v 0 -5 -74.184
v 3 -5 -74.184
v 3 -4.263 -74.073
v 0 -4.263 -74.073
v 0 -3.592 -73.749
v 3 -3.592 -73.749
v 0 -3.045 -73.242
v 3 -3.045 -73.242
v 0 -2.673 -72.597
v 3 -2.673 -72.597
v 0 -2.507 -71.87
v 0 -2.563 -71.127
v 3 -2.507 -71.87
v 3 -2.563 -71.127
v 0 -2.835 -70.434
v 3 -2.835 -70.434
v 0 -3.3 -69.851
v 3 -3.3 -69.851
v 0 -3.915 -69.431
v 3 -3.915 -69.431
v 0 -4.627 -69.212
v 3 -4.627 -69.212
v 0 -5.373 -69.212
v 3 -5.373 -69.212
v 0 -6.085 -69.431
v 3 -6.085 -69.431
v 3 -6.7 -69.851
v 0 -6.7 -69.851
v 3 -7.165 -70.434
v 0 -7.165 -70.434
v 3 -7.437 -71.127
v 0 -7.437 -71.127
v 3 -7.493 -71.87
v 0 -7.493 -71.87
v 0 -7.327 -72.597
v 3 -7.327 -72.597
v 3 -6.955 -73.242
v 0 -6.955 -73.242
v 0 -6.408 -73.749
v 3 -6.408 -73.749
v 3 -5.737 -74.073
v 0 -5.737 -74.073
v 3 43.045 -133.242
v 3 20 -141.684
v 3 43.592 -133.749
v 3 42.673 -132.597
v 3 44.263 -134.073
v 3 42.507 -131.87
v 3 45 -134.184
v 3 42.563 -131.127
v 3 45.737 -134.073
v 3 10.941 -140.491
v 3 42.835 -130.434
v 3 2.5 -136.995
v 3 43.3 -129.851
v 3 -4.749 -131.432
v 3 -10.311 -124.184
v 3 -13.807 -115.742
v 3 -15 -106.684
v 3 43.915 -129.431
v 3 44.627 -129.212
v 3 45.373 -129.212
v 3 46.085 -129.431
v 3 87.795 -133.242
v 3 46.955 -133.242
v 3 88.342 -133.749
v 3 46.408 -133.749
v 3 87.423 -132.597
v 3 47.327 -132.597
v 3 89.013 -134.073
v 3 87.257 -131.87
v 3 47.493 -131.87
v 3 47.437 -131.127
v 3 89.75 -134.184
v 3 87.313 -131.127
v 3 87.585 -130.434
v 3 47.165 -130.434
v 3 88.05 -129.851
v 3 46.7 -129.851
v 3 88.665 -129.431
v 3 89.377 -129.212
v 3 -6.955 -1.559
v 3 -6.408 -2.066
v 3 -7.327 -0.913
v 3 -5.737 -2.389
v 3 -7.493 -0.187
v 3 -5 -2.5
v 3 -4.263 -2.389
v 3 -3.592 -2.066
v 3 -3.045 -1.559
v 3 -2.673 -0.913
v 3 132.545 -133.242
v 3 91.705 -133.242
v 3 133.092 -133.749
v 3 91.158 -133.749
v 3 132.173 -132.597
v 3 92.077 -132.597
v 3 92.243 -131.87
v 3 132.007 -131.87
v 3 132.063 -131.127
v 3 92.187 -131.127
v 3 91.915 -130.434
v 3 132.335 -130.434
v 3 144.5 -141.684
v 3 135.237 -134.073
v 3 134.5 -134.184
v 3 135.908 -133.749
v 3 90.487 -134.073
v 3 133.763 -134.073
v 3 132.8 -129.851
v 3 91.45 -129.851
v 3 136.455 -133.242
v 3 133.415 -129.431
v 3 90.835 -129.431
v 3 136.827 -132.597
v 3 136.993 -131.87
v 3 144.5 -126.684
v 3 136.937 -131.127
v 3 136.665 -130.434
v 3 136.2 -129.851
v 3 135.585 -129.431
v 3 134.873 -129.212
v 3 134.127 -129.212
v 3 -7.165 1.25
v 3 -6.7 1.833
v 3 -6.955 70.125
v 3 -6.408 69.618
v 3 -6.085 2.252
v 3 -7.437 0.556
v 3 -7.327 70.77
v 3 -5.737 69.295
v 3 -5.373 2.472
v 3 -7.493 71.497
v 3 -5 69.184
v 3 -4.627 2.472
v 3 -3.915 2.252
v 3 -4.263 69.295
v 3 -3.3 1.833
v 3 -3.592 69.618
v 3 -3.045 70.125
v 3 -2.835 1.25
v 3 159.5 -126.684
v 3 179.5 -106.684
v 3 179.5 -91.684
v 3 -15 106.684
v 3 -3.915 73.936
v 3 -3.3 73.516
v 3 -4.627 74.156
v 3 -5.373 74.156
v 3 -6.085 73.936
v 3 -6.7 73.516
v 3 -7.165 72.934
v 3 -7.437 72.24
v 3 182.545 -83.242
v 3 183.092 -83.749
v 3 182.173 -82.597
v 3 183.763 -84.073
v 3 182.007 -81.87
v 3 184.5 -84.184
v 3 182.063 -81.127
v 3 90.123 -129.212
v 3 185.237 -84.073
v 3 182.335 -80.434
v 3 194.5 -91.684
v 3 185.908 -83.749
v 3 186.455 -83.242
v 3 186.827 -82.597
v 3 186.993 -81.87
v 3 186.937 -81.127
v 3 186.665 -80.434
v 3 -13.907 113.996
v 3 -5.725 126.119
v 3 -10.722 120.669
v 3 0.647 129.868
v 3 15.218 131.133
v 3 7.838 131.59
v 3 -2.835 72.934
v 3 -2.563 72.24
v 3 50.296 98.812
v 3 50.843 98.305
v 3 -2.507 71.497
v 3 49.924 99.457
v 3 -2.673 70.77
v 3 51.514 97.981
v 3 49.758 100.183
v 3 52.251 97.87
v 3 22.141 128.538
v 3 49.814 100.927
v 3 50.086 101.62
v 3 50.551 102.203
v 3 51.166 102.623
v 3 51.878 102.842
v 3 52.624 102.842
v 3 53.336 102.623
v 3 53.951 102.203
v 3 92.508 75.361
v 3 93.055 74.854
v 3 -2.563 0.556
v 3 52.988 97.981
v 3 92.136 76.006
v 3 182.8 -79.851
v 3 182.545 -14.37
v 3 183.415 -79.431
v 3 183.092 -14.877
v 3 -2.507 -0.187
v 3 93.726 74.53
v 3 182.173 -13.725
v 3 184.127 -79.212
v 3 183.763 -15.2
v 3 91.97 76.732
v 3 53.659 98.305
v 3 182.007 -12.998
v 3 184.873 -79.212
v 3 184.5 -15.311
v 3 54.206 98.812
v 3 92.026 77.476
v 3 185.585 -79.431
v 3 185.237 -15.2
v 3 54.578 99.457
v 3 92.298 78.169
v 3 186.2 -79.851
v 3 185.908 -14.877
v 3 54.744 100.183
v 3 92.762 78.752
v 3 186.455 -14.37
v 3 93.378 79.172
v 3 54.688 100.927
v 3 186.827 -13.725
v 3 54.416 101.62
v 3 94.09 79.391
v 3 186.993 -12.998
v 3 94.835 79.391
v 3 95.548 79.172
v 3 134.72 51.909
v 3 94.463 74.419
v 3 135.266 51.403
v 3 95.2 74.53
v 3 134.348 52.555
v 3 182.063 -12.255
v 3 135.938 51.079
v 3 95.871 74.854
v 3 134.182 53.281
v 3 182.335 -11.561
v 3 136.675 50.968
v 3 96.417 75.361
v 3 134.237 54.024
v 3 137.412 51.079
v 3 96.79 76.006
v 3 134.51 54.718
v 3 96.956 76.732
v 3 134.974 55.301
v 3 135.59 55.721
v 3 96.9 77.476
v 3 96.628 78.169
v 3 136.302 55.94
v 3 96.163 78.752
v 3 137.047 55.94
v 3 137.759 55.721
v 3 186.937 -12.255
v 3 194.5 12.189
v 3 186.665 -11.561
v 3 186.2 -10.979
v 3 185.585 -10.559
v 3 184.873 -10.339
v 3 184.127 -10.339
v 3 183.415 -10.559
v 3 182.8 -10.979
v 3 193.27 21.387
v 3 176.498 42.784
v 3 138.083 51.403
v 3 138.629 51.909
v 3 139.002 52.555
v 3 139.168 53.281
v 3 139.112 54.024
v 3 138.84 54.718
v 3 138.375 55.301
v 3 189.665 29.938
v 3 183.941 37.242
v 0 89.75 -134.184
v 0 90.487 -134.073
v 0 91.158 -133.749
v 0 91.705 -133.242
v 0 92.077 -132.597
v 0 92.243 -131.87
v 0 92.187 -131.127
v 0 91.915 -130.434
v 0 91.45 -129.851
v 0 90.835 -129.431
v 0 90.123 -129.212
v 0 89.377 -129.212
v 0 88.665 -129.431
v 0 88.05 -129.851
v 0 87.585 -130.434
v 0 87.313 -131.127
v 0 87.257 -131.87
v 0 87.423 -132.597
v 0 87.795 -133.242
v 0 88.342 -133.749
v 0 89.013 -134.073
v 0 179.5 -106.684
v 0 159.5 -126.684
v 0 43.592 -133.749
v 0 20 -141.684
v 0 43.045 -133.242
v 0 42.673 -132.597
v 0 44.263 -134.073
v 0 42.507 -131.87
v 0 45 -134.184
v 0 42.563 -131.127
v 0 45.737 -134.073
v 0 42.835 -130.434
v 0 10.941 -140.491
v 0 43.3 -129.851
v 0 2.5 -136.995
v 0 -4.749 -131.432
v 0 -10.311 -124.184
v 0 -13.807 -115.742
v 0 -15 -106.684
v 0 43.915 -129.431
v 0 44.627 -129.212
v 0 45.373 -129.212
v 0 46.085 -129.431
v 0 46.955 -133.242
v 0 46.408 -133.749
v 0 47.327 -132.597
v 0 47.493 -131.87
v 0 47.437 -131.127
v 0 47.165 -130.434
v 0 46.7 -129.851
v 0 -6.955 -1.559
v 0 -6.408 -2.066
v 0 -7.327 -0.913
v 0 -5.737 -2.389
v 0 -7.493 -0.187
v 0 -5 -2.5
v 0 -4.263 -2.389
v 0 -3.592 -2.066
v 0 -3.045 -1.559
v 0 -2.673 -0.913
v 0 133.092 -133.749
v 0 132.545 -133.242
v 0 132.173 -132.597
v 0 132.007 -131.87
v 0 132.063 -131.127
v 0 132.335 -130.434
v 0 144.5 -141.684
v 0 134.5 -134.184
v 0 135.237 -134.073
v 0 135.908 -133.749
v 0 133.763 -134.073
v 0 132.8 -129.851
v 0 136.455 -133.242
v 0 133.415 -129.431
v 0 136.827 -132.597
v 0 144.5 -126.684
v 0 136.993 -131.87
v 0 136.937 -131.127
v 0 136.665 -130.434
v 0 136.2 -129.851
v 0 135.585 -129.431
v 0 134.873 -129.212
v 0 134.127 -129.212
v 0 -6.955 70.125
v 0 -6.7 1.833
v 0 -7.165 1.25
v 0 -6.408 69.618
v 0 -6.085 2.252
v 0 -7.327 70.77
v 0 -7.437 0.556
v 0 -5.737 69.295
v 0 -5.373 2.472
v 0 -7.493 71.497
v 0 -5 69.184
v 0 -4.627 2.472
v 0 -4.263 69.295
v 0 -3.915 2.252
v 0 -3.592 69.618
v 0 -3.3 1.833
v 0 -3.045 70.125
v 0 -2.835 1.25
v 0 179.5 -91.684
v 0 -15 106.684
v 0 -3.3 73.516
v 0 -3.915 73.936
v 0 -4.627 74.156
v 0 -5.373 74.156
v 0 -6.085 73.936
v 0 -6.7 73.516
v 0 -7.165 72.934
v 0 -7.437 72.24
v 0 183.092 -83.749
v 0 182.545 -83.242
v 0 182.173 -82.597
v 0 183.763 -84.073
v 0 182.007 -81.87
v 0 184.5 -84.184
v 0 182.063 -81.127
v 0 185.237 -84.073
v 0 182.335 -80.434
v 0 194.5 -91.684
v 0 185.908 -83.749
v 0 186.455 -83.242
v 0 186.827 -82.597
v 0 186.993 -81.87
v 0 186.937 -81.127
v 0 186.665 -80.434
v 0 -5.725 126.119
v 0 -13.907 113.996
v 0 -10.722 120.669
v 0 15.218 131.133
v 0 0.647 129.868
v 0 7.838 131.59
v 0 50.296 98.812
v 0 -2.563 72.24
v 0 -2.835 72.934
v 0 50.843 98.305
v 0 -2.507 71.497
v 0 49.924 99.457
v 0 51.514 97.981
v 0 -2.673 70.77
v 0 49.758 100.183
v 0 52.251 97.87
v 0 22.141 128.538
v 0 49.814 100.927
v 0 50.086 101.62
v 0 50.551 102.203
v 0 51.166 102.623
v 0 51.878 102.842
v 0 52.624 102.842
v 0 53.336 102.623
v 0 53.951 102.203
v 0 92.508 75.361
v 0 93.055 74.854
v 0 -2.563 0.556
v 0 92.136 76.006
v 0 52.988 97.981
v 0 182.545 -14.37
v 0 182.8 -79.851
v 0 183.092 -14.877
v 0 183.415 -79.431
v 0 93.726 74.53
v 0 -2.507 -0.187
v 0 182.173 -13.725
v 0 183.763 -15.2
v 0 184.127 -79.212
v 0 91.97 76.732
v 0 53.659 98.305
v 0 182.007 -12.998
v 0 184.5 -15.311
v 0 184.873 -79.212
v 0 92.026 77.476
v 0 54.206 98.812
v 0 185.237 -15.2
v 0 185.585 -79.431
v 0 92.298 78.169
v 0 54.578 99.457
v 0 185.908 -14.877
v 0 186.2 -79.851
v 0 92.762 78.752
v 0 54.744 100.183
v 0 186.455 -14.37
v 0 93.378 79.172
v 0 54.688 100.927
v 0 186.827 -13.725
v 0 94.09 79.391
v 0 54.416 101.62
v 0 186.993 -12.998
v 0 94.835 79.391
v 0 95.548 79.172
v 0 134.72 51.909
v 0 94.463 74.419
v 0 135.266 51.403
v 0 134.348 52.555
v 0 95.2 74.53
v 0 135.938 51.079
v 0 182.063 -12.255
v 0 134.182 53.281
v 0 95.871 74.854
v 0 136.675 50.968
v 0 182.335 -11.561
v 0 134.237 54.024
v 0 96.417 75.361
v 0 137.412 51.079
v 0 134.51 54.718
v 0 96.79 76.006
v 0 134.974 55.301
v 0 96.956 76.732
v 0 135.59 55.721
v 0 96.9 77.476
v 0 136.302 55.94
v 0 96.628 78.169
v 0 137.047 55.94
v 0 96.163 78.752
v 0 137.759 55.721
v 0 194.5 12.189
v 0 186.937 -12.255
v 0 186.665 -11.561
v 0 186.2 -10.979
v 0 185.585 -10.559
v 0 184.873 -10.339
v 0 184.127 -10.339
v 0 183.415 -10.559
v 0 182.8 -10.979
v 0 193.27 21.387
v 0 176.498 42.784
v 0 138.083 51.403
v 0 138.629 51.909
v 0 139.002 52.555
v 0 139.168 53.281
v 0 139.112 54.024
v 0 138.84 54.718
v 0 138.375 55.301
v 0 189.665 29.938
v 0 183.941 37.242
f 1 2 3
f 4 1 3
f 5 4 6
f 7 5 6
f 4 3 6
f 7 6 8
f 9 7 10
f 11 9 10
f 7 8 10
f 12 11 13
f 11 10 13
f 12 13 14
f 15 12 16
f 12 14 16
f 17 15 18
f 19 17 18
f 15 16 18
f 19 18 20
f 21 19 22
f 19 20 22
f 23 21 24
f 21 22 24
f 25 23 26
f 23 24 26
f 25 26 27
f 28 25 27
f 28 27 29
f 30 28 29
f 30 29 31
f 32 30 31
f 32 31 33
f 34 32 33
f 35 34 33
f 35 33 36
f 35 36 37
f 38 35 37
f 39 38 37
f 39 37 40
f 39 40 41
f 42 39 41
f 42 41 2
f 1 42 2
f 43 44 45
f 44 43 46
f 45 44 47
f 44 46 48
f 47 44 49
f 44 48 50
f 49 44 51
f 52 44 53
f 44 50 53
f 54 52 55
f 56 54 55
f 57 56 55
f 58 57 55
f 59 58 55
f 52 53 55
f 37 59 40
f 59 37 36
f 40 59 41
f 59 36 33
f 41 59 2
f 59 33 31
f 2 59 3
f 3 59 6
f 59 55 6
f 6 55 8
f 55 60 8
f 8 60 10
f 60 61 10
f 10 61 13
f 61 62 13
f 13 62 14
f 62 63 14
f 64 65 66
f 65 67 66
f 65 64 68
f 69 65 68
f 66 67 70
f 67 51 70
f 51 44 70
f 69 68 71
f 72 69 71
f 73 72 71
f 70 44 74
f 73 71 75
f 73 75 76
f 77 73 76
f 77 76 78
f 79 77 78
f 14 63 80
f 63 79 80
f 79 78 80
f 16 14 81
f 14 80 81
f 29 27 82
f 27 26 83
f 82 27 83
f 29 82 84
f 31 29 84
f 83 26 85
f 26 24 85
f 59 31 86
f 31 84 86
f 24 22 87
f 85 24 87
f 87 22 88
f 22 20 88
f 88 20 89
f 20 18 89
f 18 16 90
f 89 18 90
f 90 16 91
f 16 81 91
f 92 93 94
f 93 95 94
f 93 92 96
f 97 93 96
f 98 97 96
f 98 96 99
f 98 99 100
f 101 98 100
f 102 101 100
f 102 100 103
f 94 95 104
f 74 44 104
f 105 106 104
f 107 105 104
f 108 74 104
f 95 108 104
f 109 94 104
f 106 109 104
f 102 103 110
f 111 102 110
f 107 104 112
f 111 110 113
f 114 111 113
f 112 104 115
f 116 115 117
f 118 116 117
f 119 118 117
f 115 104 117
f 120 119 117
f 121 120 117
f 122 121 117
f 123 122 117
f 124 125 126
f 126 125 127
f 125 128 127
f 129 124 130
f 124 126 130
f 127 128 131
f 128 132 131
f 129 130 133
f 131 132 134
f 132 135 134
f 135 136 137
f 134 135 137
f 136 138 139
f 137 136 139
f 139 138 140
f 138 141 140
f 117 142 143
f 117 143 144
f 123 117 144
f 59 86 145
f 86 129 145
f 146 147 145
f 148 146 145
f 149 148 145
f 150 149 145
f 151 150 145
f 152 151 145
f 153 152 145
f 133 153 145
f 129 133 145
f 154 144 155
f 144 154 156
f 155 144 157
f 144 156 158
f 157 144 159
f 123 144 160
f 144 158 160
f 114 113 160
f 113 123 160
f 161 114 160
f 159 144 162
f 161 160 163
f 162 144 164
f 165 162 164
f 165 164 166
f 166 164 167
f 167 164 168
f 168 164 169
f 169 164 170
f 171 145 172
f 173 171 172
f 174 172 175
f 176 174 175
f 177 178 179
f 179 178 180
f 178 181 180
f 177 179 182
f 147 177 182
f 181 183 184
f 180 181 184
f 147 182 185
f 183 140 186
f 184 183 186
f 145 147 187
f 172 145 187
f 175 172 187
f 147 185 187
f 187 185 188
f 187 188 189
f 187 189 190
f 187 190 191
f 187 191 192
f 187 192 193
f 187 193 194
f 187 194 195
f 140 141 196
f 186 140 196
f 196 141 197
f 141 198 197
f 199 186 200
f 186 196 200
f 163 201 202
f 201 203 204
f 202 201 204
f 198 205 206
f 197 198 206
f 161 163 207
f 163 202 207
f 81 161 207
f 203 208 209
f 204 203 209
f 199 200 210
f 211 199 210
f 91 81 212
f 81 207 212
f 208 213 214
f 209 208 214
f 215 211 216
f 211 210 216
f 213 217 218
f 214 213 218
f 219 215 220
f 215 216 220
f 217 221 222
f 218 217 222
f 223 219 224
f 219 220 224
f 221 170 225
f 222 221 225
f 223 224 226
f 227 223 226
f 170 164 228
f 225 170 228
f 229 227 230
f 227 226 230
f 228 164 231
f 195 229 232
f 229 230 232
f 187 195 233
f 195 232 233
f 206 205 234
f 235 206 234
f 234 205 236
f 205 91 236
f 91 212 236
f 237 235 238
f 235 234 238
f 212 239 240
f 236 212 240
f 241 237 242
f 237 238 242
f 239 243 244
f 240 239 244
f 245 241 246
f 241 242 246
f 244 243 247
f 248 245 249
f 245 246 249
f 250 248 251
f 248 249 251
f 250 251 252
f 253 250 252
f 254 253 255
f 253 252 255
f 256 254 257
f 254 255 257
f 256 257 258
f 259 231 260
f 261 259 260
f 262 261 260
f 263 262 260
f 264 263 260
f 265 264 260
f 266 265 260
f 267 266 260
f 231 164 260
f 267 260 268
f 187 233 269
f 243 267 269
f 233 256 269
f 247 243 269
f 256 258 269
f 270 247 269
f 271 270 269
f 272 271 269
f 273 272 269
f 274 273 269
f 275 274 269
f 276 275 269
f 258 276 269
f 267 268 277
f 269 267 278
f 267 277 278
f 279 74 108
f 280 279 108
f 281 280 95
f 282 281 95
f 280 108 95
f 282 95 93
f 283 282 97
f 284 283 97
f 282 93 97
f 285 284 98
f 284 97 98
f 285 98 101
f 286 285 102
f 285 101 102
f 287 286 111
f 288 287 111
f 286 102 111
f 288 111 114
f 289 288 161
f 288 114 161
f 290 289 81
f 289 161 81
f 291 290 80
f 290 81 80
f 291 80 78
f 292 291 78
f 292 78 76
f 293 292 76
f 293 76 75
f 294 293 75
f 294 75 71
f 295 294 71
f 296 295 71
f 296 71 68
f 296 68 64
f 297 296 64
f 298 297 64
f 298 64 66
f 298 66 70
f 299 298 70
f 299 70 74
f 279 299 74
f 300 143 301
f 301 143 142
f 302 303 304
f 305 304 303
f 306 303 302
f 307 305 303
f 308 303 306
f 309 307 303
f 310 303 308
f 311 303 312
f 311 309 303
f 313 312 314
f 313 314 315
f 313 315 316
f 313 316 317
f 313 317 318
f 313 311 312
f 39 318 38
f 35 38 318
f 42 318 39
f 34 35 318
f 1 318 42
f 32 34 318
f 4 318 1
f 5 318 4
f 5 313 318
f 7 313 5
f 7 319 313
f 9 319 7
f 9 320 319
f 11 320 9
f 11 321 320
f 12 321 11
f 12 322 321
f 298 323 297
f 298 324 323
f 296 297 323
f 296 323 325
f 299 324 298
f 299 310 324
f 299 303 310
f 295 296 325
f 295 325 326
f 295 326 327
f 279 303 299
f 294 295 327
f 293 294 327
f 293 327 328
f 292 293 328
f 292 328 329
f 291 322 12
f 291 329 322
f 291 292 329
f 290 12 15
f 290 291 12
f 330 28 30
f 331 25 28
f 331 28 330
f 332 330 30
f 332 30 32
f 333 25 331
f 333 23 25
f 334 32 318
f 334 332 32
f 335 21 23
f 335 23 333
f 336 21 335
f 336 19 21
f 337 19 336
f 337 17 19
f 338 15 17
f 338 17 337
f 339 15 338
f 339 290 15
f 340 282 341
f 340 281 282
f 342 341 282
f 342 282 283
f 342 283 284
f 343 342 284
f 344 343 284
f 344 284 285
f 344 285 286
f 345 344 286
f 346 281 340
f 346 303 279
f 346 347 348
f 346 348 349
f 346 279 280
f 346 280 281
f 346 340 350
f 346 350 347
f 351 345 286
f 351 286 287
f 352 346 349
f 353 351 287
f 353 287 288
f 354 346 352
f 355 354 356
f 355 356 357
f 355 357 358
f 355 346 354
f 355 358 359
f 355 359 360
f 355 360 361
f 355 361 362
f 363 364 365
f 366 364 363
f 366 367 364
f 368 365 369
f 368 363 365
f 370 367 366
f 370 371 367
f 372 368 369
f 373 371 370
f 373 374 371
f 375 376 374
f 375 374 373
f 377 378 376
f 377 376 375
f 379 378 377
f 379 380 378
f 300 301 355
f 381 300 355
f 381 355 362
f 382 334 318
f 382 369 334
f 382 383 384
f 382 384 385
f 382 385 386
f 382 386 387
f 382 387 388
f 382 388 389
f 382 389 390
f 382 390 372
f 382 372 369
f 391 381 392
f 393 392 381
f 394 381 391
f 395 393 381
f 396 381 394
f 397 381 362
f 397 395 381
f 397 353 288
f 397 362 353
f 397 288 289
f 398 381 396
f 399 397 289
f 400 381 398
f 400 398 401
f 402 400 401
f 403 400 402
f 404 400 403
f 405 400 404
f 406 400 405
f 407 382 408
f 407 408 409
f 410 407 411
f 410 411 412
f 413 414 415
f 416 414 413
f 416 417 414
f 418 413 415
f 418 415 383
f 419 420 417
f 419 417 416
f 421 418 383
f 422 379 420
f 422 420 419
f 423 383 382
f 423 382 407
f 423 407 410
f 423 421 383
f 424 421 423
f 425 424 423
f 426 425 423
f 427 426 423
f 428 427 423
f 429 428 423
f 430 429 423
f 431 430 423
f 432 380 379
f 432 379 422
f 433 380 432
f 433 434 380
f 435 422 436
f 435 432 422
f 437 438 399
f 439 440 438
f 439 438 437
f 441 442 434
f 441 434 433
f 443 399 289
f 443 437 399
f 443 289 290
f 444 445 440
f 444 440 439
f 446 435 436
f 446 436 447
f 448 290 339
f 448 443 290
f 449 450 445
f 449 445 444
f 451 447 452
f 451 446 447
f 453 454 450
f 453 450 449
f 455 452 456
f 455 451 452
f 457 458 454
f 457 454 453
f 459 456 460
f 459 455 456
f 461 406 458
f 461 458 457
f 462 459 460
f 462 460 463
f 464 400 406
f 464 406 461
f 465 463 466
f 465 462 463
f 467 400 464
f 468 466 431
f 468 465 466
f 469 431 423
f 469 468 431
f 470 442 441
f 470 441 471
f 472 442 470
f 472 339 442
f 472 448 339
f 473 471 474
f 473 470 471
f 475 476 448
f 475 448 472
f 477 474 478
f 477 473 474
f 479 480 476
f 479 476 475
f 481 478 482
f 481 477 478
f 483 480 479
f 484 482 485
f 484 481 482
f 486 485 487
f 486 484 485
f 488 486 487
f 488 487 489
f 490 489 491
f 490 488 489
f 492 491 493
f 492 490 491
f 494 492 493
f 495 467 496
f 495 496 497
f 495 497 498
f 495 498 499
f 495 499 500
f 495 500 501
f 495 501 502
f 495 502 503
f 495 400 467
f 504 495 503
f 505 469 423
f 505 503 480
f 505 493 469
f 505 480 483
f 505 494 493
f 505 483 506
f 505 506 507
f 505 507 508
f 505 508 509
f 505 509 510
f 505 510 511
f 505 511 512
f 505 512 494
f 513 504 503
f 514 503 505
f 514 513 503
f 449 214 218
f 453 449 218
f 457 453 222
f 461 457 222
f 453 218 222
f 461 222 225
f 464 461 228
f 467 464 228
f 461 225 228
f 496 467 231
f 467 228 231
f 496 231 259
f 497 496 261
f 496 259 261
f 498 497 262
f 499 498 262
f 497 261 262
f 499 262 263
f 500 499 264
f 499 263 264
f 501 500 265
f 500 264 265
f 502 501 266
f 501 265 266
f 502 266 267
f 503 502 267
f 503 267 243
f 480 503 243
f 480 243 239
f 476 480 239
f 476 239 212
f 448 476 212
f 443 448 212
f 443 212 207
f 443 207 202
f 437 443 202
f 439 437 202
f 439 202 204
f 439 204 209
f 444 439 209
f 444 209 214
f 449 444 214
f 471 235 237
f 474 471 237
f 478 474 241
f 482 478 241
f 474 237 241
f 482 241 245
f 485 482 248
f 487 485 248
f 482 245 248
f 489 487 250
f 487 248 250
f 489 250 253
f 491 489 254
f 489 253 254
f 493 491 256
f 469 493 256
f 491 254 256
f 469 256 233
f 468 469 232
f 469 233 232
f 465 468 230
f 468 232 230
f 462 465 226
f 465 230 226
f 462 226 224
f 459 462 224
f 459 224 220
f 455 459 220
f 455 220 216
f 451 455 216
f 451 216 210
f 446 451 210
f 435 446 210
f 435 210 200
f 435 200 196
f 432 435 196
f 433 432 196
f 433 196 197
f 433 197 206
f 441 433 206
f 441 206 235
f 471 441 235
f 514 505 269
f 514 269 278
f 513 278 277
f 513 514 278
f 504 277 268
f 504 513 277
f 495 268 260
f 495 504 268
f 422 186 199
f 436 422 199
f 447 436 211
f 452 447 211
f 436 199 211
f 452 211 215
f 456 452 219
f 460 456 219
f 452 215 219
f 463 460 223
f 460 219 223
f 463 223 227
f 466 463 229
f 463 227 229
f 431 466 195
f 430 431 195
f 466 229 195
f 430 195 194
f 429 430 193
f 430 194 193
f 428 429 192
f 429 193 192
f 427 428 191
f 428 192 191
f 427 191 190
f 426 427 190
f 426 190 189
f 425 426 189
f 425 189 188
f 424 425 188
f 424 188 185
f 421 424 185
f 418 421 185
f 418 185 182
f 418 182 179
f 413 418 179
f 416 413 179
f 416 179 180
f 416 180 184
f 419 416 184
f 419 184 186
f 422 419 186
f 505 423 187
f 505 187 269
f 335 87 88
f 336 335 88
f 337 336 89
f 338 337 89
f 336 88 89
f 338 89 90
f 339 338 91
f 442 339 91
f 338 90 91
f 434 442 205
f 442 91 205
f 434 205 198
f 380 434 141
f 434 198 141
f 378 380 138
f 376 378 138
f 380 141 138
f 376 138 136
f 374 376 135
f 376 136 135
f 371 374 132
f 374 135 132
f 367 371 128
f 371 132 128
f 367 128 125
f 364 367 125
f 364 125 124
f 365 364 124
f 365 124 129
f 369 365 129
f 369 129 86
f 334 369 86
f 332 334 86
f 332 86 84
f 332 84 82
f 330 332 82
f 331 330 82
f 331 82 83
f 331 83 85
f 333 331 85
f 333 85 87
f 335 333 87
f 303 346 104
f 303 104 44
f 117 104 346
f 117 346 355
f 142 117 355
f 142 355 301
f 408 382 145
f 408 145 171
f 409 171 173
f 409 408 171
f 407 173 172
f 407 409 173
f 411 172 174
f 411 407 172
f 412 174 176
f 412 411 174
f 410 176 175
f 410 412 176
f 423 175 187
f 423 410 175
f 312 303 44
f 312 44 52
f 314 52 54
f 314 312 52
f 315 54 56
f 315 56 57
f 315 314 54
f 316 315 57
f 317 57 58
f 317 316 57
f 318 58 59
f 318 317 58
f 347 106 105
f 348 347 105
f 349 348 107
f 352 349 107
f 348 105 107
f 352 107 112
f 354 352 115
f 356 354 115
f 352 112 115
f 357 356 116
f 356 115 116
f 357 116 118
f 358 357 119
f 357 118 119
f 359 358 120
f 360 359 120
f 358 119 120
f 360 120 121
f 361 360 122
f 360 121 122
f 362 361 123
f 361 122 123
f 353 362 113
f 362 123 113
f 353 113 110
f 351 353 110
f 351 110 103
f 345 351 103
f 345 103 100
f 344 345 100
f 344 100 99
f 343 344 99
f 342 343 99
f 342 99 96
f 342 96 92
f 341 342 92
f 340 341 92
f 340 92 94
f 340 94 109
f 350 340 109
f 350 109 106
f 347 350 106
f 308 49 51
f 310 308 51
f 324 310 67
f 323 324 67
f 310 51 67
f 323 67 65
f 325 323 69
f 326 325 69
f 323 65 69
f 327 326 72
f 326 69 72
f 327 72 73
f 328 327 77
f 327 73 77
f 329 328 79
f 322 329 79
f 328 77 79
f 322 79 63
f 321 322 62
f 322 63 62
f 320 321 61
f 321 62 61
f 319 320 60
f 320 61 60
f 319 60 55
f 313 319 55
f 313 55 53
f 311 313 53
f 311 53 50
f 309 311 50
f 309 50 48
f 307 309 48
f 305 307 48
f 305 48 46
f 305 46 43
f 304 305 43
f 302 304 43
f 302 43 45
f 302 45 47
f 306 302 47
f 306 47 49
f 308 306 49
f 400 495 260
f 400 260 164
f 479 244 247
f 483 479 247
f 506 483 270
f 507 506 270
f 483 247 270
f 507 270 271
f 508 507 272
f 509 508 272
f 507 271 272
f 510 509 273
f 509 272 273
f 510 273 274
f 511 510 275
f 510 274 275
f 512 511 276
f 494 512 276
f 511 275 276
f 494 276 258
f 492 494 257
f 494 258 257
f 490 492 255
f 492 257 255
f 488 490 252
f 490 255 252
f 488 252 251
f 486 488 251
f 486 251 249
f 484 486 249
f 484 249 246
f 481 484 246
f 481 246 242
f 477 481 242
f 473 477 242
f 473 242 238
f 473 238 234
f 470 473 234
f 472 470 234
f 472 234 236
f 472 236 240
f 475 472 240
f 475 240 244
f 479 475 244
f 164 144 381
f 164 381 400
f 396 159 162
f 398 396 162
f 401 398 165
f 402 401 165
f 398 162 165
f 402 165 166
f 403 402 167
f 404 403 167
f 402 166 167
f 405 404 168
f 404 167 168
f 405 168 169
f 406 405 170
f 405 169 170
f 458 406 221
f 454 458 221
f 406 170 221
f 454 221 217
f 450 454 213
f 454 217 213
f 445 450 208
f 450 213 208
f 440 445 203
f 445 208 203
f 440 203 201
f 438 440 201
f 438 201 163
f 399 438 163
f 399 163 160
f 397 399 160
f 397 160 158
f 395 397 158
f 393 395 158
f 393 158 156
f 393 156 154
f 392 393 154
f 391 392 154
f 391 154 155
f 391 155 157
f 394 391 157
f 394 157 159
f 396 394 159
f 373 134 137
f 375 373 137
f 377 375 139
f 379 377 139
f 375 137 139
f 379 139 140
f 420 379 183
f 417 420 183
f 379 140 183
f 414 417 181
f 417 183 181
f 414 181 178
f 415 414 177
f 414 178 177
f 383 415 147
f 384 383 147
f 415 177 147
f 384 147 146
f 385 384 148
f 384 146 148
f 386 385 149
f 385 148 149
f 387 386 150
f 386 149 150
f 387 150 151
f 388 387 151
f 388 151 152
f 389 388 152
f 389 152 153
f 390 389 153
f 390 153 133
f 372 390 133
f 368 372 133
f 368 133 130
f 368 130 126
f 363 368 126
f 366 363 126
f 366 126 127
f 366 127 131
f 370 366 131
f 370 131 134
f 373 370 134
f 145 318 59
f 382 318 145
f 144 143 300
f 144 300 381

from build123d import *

# Parameters (mm, degrees)
BOSS_EXTRUDE1_DEPTH = 3
CUT_EXTRUDE1_REACH  = 242.652
SKETCH2_R           = 2.5
CUT_EXTRUDE2_REACH  = 242.652
CUT_EXTRUDE3_REACH  = 242.652


with BuildPart() as part:
    # Sketch1 → Boss-Extrude1 (new body)
    with BuildSketch(Plane(origin=(0, 0, 0), x_dir=(0, 0, -1), z_dir=(1, 0, 0))):
        with BuildLine():
            Line((-12.188515962, 194.5), (106.683660563, 194.5))
            ThreePointArc((106.683660563, 194.5), (131.432397904, 184.248737342), (141.683660563, 159.5))
            Line((141.683660563, 159.5), (141.683660563, 20))
            ThreePointArc((141.683660563, 20), (131.432397904, -4.748737342), (106.683660563, -15))
            Line((106.683660563, -15), (-106.683660563, -15))
            ThreePointArc((-106.683660563, -15), (-128.230433314, -2.678193247), (-128.537592466, 22.141073279))
            Line((-128.537592466, 22.141073279), (-42.784020626, 176.497502591))
            ThreePointArc((-42.784020626, 176.497502591), (-29.937986507, 189.665481852), (-12.188515962, 194.5))
        make_face()
    extrude(amount=BOSS_EXTRUDE1_DEPTH)

    # Sketch2 → Cut-Extrude1 (cut, up to next)
    with BuildSketch(Plane(origin=(3, 0, 0), x_dir=(0, 0, -1), z_dir=(1, 0, 0)), mode=Mode.PRIVATE) as cut_extrude1_sk1:
        with Locations((81.683660563, 184.5)):
            Circle(SKETCH2_R)
    cut_extrude1_tool1 = extrude(cut_extrude1_sk1.sketch, amount=-CUT_EXTRUDE1_REACH, mode=Mode.PRIVATE) & part.part
    # Sketch2 → Cut-Extrude1 (cut, up to next)
    with BuildSketch(Plane(origin=(3, 0, 0), x_dir=(0, 0, -1), z_dir=(1, 0, 0)), mode=Mode.PRIVATE) as cut_extrude1_sk2:
        with Locations((12.811484038, 184.5)):
            Circle(SKETCH2_R)
    cut_extrude1_tool2 = extrude(cut_extrude1_sk2.sketch, amount=-CUT_EXTRUDE1_REACH, mode=Mode.PRIVATE) & part.part
    # Sketch2 → Cut-Extrude1 (cut, up to next)
    with BuildSketch(Plane(origin=(3, 0, 0), x_dir=(0, 0, -1), z_dir=(1, 0, 0)), mode=Mode.PRIVATE) as cut_extrude1_sk3:
        with Locations((131.683660563, 134.49995686)):
            Circle(SKETCH2_R)
    cut_extrude1_tool3 = extrude(cut_extrude1_sk3.sketch, amount=-CUT_EXTRUDE1_REACH, mode=Mode.PRIVATE) & part.part
    # Sketch2 → Cut-Extrude1 (cut, up to next)
    with BuildSketch(Plane(origin=(3, 0, 0), x_dir=(0, 0, -1), z_dir=(1, 0, 0)), mode=Mode.PRIVATE) as cut_extrude1_sk4:
        with Locations((131.683660563, 89.75)):
            Circle(SKETCH2_R)
    cut_extrude1_tool4 = extrude(cut_extrude1_sk4.sketch, amount=-CUT_EXTRUDE1_REACH, mode=Mode.PRIVATE) & part.part
    # Sketch2 → Cut-Extrude1 (cut, up to next)
    with BuildSketch(Plane(origin=(3, 0, 0), x_dir=(0, 0, -1), z_dir=(1, 0, 0)), mode=Mode.PRIVATE) as cut_extrude1_sk5:
        with Locations((131.683660563, 44.999939605)):
            Circle(SKETCH2_R)
    cut_extrude1_tool5 = extrude(cut_extrude1_sk5.sketch, amount=-CUT_EXTRUDE1_REACH, mode=Mode.PRIVATE) & part.part
    # Sketch2 → Cut-Extrude1 (cut, up to next)
    with BuildSketch(Plane(origin=(3, 0, 0), x_dir=(0, 0, -1), z_dir=(1, 0, 0)), mode=Mode.PRIVATE) as cut_extrude1_sk6:
        with Locations((71.683660563, -5)):
            Circle(SKETCH2_R)
    cut_extrude1_tool6 = extrude(cut_extrude1_sk6.sketch, amount=-CUT_EXTRUDE1_REACH, mode=Mode.PRIVATE) & part.part
    # Sketch2 → Cut-Extrude1 (cut, up to next)
    with BuildSketch(Plane(origin=(3, 0, 0), x_dir=(0, 0, -1), z_dir=(1, 0, 0)), mode=Mode.PRIVATE) as cut_extrude1_sk7:
        with Locations((0, -5)):
            Circle(SKETCH2_R)
    cut_extrude1_tool7 = extrude(cut_extrude1_sk7.sketch, amount=-CUT_EXTRUDE1_REACH, mode=Mode.PRIVATE) & part.part
    # Sketch2 → Cut-Extrude1 (cut, up to next)
    with BuildSketch(Plane(origin=(3, 0, 0), x_dir=(0, 0, -1), z_dir=(1, 0, 0)), mode=Mode.PRIVATE) as cut_extrude1_sk8:
        with Locations((-71.683660563, -5)):
            Circle(SKETCH2_R)
    cut_extrude1_tool8 = extrude(cut_extrude1_sk8.sketch, amount=-CUT_EXTRUDE1_REACH, mode=Mode.PRIVATE) & part.part
    # Sketch2 → Cut-Extrude1 (cut, up to next)
    with BuildSketch(Plane(origin=(3, 0, 0), x_dir=(0, 0, -1), z_dir=(1, 0, 0)), mode=Mode.PRIVATE) as cut_extrude1_sk9:
        with Locations((-100.370302458, 52.250935013)):
            Circle(SKETCH2_R)
    cut_extrude1_tool9 = extrude(cut_extrude1_sk9.sketch, amount=-CUT_EXTRUDE1_REACH, mode=Mode.PRIVATE) & part.part
    # Sketch2 → Cut-Extrude1 (cut, up to next)
    with BuildSketch(Plane(origin=(3, 0, 0), x_dir=(0, 0, -1), z_dir=(1, 0, 0)), mode=Mode.PRIVATE) as cut_extrude1_sk10:
        with Locations((-76.919233785, 94.462858624)):
            Circle(SKETCH2_R)
    cut_extrude1_tool10 = extrude(cut_extrude1_sk10.sketch, amount=-CUT_EXTRUDE1_REACH, mode=Mode.PRIVATE) & part.part
    # Sketch2 → Cut-Extrude1 (cut, up to next)
    with BuildSketch(Plane(origin=(3, 0, 0), x_dir=(0, 0, -1), z_dir=(1, 0, 0)), mode=Mode.PRIVATE) as cut_extrude1_sk11:
        with Locations((-53.468165112, 136.674782235)):
            Circle(SKETCH2_R)
    cut_extrude1_tool11 = extrude(cut_extrude1_sk11.sketch, amount=-CUT_EXTRUDE1_REACH, mode=Mode.PRIVATE) & part.part
    add(cut_extrude1_tool1.solids().sort_by_distance((3, 184.5, -81.683661))[0], mode=Mode.SUBTRACT)
    add(cut_extrude1_tool2.solids().sort_by_distance((3, 184.5, -12.811484))[0], mode=Mode.SUBTRACT)
    add(cut_extrude1_tool3.solids().sort_by_distance((3, 134.499957, -131.683661))[0], mode=Mode.SUBTRACT)
    add(cut_extrude1_tool4.solids().sort_by_distance((3, 89.75, -131.683661))[0], mode=Mode.SUBTRACT)
    add(cut_extrude1_tool5.solids().sort_by_distance((3, 44.99994, -131.683661))[0], mode=Mode.SUBTRACT)
    add(cut_extrude1_tool6.solids().sort_by_distance((3, -5, -71.683661))[0], mode=Mode.SUBTRACT)
    add(cut_extrude1_tool7.solids().sort_by_distance((3, -5, 0))[0], mode=Mode.SUBTRACT)
    add(cut_extrude1_tool8.solids().sort_by_distance((3, -5, 71.683661))[0], mode=Mode.SUBTRACT)
    add(cut_extrude1_tool9.solids().sort_by_distance((3, 52.250935, 100.370302))[0], mode=Mode.SUBTRACT)
    add(cut_extrude1_tool10.solids().sort_by_distance((3, 94.462859, 76.919234))[0], mode=Mode.SUBTRACT)
    add(cut_extrude1_tool11.solids().sort_by_distance((3, 136.674782, 53.468165))[0], mode=Mode.SUBTRACT)

    # Sketch4 → Cut-Extrude2 (cut, up to next)
    with BuildSketch(Plane(origin=(3, 0, 0), x_dir=(0, 0, -1), z_dir=(1, 0, 0)), mode=Mode.PRIVATE) as cut_extrude2_sk1:
        with BuildLine():
            Line((141.683660563, 144.5), (126.683660563, 144.5))
            Line((126.683660563, 144.5), (126.683660563, 159.5))
            ThreePointArc((126.683660563, 159.5), (120.825796187, 173.642135624), (106.683660563, 179.5))
            Line((106.683660563, 179.5), (91.683660563, 179.5))
            Line((91.683660563, 179.5), (91.683660563, 194.5))
            Line((91.683660563, 194.5), (141.683660563, 194.5))
            Line((141.683660563, 194.5), (141.683660563, 144.5))
        make_face()
    cut_extrude2_tool1 = extrude(cut_extrude2_sk1.sketch, amount=-CUT_EXTRUDE2_REACH, mode=Mode.PRIVATE) & part.part
    add(cut_extrude2_tool1.solids().sort_by_distance((3, 176.600336, -123.783996))[0], mode=Mode.SUBTRACT)

    # Sketch5 → Cut-Extrude3 (cut, up to next)
    with BuildSketch(Plane(origin=(3, 0, 0), x_dir=(0, 0, -1), z_dir=(1, 0, 0)), mode=Mode.PRIVATE) as cut_extrude3_sk1:
        with BuildLine():
            Line((106.683660563, 179.5), (126.683660563, 159.5))
            ThreePointArc((126.683660563, 159.5), (120.825796187, 173.642135624), (106.683660563, 179.5))
        make_face()
    cut_extrude3_tool1 = extrude(cut_extrude3_sk1.sketch, amount=-CUT_EXTRUDE3_REACH, mode=Mode.PRIVATE) & part.part
    add(cut_extrude3_tool1.solids().sort_by_distance((3, 171.179589, -118.36325))[0], mode=Mode.SUBTRACT)


solid = part.part
